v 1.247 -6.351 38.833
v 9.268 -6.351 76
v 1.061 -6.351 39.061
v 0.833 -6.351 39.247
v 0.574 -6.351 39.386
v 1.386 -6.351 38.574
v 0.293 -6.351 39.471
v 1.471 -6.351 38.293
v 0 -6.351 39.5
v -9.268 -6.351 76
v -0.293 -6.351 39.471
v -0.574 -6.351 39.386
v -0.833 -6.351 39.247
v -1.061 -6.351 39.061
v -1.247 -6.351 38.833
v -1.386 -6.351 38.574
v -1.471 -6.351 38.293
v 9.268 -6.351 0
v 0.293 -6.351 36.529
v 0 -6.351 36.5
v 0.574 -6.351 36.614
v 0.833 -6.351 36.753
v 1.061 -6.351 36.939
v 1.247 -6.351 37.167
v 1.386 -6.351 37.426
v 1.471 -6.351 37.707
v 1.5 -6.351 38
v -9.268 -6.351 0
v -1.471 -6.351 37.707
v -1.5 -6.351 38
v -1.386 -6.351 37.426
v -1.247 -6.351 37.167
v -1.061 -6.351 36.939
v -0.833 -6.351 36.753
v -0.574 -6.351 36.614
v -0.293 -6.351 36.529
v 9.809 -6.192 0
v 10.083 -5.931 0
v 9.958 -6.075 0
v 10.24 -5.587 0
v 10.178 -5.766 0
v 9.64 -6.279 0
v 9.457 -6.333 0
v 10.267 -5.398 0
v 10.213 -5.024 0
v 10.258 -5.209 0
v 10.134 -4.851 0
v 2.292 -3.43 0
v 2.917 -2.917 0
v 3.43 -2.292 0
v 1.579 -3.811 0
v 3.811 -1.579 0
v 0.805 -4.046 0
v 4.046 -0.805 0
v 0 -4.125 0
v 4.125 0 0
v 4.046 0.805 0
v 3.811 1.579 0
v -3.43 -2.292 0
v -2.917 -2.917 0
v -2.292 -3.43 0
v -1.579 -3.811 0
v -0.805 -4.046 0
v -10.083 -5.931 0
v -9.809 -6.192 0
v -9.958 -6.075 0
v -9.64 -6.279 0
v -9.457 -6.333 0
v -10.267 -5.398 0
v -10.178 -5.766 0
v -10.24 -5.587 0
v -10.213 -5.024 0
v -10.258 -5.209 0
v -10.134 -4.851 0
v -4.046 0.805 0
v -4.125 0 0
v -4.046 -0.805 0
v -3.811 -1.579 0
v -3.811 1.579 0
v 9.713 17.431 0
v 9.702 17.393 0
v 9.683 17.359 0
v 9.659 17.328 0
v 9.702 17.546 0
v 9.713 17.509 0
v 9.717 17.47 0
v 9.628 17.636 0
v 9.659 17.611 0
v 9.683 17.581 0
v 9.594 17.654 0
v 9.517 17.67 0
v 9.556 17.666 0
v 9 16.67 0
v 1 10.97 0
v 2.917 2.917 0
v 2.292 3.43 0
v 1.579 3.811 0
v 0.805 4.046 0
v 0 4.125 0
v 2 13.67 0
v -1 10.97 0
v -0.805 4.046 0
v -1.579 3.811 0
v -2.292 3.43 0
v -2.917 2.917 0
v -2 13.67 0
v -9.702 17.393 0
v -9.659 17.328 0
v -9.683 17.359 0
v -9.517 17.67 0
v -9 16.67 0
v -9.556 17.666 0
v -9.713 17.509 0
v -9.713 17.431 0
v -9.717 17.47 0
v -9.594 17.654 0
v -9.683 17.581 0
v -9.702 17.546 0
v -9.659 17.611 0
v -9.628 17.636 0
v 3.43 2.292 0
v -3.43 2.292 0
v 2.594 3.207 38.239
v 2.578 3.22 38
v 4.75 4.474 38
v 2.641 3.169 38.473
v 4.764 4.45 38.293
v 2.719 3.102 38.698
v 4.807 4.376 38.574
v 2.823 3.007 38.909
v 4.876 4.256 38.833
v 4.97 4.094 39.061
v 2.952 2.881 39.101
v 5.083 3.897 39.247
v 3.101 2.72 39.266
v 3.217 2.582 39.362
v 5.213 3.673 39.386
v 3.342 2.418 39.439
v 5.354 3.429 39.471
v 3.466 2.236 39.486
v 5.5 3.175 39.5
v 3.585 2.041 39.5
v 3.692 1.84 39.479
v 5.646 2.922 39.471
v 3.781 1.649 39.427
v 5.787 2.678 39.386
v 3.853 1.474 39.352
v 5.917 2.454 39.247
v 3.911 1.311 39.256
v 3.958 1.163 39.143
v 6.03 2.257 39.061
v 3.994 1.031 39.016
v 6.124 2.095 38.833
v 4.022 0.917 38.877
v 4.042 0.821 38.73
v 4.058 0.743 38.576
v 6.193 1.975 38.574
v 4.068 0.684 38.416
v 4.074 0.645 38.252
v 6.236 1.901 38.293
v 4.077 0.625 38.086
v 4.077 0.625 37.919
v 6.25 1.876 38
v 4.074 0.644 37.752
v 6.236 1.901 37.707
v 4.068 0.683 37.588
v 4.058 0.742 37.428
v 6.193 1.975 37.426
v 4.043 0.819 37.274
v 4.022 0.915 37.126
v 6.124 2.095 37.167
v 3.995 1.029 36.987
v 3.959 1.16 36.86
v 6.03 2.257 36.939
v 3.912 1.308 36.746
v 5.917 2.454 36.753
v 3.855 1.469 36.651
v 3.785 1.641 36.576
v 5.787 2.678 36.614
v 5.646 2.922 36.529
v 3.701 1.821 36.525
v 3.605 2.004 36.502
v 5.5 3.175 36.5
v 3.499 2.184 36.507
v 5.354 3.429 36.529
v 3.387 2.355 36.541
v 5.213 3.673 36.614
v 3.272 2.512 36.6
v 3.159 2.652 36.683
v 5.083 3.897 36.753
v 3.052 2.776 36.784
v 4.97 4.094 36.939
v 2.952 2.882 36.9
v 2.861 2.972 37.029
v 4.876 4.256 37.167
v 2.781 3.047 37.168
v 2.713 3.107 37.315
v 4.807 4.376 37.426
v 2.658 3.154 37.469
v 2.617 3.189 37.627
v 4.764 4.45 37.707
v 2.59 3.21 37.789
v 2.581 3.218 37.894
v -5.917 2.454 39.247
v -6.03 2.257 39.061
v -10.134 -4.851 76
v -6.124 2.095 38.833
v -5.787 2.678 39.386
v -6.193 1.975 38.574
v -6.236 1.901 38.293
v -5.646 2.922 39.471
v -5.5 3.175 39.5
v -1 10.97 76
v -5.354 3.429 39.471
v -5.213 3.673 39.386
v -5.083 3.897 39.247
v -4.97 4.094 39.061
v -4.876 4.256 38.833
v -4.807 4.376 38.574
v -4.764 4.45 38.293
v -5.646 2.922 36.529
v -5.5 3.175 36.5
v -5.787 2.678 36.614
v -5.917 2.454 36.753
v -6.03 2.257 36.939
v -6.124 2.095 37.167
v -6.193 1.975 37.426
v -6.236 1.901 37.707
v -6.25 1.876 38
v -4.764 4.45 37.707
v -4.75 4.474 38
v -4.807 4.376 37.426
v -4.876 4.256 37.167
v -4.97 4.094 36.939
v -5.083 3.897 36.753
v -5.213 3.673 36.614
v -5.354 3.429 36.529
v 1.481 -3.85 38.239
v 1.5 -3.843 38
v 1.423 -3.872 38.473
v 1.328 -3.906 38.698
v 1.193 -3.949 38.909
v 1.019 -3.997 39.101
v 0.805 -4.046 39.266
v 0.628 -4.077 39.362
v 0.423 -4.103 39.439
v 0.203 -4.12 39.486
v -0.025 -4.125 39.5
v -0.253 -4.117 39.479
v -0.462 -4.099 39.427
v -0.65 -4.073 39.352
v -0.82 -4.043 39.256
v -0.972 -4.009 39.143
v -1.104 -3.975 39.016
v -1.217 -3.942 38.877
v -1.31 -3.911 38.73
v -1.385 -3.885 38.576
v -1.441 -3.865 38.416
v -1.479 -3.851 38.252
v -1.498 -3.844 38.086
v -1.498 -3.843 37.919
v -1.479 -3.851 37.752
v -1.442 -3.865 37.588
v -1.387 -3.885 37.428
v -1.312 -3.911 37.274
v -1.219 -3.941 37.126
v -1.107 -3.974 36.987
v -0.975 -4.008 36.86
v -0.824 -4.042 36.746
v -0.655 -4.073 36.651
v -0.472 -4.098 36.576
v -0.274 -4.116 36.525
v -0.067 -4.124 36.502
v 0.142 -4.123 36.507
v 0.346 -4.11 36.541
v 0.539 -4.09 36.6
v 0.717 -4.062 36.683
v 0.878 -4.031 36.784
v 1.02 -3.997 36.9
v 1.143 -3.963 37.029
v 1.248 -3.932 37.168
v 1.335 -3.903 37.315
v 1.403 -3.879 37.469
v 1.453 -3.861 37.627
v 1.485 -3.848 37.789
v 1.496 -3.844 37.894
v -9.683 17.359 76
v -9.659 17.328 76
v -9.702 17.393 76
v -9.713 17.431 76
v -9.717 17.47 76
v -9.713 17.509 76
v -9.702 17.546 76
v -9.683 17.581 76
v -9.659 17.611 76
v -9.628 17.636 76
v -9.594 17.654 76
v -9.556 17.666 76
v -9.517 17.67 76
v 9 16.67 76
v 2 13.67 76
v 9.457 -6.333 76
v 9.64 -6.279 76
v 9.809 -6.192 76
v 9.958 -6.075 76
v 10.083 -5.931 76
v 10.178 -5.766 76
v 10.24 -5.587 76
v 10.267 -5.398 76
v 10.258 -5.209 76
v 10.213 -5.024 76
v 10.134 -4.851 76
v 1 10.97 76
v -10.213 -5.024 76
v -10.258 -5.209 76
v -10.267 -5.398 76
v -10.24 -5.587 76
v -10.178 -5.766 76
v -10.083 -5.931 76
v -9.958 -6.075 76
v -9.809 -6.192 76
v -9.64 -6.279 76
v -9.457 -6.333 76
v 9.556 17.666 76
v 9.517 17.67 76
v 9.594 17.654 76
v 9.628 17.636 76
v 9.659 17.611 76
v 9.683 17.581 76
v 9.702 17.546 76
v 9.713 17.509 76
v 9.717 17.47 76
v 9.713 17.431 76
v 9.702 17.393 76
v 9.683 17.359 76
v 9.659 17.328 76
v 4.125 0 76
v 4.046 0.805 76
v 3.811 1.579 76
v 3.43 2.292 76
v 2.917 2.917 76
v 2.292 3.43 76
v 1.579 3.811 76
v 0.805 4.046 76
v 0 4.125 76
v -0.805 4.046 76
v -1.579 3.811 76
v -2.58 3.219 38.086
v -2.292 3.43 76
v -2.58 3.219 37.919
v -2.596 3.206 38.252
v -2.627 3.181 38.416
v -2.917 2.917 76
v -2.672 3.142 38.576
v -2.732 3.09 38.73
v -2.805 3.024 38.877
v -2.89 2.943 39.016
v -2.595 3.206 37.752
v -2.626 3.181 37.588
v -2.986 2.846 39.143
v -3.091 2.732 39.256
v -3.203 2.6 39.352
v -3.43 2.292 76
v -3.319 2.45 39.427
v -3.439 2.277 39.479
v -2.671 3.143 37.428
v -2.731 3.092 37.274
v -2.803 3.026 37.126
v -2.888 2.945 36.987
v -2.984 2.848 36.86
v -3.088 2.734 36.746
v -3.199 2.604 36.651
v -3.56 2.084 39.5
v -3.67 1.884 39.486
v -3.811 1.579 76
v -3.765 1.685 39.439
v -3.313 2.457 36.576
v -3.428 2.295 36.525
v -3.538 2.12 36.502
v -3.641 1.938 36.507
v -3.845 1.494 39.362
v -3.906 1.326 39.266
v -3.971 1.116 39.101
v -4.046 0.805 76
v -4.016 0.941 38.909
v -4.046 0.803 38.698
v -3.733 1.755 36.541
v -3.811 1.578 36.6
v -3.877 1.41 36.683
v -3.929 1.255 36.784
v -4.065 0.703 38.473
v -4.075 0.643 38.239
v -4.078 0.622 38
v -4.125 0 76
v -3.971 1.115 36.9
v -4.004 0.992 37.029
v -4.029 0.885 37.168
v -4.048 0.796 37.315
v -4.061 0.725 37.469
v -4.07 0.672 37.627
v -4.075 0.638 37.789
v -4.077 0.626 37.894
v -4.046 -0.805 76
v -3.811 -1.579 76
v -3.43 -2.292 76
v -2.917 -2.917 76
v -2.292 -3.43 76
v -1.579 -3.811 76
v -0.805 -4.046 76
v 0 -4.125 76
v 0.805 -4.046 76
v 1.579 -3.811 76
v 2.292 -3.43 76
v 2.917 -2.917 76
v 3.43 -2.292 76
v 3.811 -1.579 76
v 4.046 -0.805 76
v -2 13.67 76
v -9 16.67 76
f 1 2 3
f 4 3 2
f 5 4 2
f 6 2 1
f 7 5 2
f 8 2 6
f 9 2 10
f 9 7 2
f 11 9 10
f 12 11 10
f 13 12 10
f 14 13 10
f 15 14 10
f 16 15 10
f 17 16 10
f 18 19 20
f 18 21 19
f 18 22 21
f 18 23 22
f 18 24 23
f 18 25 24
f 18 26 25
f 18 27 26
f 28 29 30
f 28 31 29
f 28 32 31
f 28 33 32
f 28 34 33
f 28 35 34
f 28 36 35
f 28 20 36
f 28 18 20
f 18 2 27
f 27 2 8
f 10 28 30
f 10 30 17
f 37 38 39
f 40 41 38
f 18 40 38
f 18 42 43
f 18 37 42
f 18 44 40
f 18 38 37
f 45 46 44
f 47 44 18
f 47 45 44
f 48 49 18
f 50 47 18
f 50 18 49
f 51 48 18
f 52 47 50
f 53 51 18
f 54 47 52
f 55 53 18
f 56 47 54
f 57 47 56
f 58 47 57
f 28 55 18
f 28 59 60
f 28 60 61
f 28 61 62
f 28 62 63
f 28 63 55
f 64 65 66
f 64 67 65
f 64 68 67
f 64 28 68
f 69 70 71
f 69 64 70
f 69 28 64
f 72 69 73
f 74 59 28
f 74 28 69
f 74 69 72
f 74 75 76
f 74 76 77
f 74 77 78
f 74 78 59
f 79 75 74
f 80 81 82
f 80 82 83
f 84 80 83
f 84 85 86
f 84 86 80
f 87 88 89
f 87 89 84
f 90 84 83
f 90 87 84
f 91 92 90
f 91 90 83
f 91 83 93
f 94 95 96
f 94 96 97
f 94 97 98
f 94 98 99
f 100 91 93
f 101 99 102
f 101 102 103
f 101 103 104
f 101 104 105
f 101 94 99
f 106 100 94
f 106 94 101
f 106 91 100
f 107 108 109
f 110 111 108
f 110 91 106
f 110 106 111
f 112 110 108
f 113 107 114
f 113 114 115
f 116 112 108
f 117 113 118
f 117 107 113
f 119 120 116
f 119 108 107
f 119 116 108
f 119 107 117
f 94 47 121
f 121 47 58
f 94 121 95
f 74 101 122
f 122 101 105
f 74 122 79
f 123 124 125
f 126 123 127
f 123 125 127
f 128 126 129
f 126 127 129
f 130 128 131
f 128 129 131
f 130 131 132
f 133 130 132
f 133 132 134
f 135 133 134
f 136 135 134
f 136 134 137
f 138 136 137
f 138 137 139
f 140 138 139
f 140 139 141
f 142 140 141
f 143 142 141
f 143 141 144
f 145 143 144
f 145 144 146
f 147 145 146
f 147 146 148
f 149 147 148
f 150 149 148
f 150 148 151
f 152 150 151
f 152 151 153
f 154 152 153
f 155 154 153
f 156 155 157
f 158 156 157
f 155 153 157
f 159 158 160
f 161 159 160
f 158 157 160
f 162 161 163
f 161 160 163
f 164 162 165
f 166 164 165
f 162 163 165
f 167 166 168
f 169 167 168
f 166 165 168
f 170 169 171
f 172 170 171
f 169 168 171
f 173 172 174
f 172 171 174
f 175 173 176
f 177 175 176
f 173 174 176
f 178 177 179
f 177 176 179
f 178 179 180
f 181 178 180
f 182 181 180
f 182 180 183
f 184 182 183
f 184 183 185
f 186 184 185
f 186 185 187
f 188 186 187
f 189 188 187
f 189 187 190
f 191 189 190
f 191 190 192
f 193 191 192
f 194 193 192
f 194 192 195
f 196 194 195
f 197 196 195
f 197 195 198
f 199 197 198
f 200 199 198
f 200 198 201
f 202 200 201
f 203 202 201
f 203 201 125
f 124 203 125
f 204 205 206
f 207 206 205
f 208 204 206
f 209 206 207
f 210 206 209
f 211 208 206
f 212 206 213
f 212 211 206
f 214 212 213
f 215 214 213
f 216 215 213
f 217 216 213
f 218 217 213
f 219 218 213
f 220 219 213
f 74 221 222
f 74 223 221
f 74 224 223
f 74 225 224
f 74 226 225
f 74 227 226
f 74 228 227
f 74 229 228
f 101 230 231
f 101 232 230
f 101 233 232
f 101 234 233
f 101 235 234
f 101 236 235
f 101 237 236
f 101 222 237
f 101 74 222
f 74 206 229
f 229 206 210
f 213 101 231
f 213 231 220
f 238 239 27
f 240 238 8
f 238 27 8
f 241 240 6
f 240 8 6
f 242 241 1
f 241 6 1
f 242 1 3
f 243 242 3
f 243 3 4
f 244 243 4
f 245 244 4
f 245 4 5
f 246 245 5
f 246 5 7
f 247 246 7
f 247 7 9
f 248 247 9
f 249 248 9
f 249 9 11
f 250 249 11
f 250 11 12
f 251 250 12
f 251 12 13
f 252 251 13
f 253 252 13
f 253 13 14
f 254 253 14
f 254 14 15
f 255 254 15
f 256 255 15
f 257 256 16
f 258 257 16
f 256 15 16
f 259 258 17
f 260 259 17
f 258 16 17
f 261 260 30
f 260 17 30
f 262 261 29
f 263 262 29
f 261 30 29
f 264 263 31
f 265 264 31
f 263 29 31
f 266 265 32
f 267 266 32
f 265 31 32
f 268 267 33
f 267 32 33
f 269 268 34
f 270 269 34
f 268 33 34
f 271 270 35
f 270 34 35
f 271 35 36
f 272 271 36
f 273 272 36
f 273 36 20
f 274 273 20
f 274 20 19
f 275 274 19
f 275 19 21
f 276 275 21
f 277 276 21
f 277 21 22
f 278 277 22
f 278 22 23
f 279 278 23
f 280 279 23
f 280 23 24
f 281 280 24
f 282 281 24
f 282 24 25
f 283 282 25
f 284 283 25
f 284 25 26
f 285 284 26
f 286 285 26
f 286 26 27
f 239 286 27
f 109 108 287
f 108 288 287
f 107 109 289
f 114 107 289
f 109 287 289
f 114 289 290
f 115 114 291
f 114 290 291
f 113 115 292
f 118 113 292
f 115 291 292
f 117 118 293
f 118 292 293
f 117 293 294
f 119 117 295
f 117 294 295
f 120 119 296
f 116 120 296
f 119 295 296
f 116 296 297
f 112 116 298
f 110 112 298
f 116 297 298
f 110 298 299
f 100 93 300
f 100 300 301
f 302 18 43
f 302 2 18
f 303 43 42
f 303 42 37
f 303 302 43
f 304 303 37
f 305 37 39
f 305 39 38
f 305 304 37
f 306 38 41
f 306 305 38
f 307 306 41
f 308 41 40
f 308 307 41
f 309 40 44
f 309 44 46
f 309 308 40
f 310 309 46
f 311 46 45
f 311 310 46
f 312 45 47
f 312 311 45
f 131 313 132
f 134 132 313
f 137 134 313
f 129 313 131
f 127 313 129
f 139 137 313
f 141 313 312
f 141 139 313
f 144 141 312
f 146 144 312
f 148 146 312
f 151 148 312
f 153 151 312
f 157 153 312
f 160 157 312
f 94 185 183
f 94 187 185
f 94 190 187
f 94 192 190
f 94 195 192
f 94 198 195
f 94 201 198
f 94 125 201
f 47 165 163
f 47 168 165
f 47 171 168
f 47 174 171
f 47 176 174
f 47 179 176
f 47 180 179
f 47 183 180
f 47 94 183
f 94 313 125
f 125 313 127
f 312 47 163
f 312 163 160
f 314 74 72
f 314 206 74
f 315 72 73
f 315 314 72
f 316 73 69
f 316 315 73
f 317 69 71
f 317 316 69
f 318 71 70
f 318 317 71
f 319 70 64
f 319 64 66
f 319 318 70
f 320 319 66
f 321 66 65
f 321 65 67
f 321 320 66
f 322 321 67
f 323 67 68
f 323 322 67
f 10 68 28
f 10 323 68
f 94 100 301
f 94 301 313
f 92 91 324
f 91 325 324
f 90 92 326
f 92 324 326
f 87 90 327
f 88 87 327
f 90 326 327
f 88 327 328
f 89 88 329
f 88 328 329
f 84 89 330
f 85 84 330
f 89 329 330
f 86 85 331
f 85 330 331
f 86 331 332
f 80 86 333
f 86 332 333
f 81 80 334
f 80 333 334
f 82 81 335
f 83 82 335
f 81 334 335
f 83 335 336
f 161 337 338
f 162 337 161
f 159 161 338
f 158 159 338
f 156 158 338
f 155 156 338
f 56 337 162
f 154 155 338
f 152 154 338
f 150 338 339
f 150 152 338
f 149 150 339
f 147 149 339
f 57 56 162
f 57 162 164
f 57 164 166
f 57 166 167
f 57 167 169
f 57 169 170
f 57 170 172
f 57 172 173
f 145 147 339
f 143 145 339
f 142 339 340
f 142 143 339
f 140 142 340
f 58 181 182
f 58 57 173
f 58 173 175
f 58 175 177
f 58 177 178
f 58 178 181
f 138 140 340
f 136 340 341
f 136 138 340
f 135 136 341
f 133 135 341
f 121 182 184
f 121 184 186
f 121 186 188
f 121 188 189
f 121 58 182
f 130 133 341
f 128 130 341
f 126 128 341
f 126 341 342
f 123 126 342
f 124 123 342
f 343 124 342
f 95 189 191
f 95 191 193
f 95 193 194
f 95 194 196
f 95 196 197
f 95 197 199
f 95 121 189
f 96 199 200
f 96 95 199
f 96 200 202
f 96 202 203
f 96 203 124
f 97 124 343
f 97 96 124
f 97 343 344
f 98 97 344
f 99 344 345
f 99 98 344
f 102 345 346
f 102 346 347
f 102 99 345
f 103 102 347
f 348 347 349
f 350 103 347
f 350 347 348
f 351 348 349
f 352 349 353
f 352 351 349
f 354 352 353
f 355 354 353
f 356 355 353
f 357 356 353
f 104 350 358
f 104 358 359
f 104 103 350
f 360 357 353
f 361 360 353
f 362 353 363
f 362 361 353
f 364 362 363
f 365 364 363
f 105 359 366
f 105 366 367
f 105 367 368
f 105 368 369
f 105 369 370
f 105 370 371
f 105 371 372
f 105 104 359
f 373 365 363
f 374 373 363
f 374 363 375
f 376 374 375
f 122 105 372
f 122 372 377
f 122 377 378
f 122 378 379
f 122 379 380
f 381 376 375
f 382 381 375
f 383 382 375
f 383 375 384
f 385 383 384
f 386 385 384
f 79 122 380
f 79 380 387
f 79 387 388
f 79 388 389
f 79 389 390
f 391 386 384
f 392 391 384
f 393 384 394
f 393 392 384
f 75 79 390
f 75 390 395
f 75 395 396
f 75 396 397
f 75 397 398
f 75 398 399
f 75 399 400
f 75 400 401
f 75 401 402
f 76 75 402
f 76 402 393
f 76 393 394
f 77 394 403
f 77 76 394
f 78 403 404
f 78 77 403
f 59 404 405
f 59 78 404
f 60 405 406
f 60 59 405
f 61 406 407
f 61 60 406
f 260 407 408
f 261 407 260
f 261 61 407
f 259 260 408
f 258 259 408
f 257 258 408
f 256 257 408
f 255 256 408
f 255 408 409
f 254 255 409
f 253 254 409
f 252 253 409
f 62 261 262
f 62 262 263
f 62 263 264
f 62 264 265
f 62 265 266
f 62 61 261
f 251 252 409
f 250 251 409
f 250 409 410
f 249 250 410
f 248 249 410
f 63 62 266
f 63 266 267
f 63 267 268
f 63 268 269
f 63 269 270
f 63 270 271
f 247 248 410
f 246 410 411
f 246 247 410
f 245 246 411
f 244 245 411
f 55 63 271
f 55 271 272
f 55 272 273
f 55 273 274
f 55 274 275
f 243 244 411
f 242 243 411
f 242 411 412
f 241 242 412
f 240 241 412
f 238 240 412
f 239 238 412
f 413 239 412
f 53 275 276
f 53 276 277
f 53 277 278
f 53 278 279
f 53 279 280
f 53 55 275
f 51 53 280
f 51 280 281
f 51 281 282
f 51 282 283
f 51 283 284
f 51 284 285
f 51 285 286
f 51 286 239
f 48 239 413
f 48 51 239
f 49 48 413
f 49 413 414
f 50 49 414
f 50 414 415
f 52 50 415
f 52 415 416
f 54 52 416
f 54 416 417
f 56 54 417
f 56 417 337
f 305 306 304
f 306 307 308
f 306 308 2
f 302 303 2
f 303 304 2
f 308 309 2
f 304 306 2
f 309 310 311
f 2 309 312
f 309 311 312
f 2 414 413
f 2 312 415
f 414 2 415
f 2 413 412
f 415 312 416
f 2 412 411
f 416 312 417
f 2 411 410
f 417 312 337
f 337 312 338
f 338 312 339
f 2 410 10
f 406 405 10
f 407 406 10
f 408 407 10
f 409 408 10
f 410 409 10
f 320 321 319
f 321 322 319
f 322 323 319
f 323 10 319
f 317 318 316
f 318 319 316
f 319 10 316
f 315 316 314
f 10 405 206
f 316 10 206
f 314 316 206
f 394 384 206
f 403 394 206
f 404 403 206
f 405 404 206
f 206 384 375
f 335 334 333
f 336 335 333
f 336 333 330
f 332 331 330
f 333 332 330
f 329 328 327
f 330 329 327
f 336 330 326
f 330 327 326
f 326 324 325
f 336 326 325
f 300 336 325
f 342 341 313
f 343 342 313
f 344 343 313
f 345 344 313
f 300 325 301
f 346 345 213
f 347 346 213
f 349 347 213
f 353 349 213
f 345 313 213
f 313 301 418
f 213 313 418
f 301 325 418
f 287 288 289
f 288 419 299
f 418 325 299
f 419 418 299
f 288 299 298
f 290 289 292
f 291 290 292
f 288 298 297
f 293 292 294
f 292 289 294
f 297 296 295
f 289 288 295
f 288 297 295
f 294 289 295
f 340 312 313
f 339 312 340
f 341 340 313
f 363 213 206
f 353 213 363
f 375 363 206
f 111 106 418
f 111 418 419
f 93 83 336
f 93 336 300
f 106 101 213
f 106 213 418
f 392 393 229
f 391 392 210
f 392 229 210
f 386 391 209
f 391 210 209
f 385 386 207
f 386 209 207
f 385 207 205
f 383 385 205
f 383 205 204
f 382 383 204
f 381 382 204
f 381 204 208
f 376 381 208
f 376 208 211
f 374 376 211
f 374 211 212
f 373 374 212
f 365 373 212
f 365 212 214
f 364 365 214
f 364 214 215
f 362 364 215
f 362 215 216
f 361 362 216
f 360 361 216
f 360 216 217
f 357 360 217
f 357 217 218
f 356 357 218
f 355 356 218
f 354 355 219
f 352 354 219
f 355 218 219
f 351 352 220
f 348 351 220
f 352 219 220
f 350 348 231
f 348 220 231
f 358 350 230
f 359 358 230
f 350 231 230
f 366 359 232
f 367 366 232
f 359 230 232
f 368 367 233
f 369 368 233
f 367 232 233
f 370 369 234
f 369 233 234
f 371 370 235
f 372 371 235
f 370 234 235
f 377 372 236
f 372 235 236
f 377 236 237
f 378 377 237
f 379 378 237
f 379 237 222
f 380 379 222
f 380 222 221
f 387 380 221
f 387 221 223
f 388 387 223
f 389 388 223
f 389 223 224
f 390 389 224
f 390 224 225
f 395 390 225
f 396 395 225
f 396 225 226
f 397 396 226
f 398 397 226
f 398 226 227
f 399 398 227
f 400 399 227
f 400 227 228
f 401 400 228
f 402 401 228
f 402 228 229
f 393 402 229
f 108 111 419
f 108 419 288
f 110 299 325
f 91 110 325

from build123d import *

# Parameters (mm, degrees)
SKETCH_R           = 4.125
PAD_DEPTH          = 76
SKETCH001_R        = 1.5
POCKET_DEPTH       = 5
POLARPATTERN_COUNT = 3
FILLET_R           = 1
FILLET001_R        = 0.2


with BuildPart() as part:
    # Sketch → Pad (new body)
    with BuildSketch(Plane.XY):
        Polygon((-11, -6.350853), (-1, 10.969655), (-2, 13.669655), (-9, 16.669655), (-10, 17.669655), (10, 17.669655), (9, 16.669655), (2, 13.669655), (1, 10.969655), (11, -6.350853), align=None)
        Circle(SKETCH_R, mode=Mode.SUBTRACT)
    extrude(amount=PAD_DEPTH)

    # Sketch001 → Pocket (cut)
    with BuildSketch(Plane.XZ.offset(6.350853)):
        with Locations((0, 38)):
            Circle(SKETCH001_R)
    pocket = extrude(amount=-POCKET_DEPTH, mode=Mode.SUBTRACT)

    # PolarPattern: Pocket ×3 about axis
    polarpattern_axis = Axis((0, 0, 0), (0, 0, 1))
    for i in range(1, POLARPATTERN_COUNT):
        add(pocket.rotate(polarpattern_axis, i * 360 / POLARPATTERN_COUNT), mode=Mode.SUBTRACT)

    # Fillet
    fillet_edges = [part.edges().sort_by_distance(p)[0] for p in [
        (11, -6.350853, 38),
        (-11, -6.350853, 38),
    ]]
    fillet(fillet_edges, radius=FILLET_R)

    # Fillet001
    fillet001_edges = [part.edges().sort_by_distance(p)[0] for p in [
        (10, 17.669655, 38),
        (-10, 17.669655, 38),
    ]]
    fillet(fillet001_edges, radius=FILLET001_R)


solid = part.part
